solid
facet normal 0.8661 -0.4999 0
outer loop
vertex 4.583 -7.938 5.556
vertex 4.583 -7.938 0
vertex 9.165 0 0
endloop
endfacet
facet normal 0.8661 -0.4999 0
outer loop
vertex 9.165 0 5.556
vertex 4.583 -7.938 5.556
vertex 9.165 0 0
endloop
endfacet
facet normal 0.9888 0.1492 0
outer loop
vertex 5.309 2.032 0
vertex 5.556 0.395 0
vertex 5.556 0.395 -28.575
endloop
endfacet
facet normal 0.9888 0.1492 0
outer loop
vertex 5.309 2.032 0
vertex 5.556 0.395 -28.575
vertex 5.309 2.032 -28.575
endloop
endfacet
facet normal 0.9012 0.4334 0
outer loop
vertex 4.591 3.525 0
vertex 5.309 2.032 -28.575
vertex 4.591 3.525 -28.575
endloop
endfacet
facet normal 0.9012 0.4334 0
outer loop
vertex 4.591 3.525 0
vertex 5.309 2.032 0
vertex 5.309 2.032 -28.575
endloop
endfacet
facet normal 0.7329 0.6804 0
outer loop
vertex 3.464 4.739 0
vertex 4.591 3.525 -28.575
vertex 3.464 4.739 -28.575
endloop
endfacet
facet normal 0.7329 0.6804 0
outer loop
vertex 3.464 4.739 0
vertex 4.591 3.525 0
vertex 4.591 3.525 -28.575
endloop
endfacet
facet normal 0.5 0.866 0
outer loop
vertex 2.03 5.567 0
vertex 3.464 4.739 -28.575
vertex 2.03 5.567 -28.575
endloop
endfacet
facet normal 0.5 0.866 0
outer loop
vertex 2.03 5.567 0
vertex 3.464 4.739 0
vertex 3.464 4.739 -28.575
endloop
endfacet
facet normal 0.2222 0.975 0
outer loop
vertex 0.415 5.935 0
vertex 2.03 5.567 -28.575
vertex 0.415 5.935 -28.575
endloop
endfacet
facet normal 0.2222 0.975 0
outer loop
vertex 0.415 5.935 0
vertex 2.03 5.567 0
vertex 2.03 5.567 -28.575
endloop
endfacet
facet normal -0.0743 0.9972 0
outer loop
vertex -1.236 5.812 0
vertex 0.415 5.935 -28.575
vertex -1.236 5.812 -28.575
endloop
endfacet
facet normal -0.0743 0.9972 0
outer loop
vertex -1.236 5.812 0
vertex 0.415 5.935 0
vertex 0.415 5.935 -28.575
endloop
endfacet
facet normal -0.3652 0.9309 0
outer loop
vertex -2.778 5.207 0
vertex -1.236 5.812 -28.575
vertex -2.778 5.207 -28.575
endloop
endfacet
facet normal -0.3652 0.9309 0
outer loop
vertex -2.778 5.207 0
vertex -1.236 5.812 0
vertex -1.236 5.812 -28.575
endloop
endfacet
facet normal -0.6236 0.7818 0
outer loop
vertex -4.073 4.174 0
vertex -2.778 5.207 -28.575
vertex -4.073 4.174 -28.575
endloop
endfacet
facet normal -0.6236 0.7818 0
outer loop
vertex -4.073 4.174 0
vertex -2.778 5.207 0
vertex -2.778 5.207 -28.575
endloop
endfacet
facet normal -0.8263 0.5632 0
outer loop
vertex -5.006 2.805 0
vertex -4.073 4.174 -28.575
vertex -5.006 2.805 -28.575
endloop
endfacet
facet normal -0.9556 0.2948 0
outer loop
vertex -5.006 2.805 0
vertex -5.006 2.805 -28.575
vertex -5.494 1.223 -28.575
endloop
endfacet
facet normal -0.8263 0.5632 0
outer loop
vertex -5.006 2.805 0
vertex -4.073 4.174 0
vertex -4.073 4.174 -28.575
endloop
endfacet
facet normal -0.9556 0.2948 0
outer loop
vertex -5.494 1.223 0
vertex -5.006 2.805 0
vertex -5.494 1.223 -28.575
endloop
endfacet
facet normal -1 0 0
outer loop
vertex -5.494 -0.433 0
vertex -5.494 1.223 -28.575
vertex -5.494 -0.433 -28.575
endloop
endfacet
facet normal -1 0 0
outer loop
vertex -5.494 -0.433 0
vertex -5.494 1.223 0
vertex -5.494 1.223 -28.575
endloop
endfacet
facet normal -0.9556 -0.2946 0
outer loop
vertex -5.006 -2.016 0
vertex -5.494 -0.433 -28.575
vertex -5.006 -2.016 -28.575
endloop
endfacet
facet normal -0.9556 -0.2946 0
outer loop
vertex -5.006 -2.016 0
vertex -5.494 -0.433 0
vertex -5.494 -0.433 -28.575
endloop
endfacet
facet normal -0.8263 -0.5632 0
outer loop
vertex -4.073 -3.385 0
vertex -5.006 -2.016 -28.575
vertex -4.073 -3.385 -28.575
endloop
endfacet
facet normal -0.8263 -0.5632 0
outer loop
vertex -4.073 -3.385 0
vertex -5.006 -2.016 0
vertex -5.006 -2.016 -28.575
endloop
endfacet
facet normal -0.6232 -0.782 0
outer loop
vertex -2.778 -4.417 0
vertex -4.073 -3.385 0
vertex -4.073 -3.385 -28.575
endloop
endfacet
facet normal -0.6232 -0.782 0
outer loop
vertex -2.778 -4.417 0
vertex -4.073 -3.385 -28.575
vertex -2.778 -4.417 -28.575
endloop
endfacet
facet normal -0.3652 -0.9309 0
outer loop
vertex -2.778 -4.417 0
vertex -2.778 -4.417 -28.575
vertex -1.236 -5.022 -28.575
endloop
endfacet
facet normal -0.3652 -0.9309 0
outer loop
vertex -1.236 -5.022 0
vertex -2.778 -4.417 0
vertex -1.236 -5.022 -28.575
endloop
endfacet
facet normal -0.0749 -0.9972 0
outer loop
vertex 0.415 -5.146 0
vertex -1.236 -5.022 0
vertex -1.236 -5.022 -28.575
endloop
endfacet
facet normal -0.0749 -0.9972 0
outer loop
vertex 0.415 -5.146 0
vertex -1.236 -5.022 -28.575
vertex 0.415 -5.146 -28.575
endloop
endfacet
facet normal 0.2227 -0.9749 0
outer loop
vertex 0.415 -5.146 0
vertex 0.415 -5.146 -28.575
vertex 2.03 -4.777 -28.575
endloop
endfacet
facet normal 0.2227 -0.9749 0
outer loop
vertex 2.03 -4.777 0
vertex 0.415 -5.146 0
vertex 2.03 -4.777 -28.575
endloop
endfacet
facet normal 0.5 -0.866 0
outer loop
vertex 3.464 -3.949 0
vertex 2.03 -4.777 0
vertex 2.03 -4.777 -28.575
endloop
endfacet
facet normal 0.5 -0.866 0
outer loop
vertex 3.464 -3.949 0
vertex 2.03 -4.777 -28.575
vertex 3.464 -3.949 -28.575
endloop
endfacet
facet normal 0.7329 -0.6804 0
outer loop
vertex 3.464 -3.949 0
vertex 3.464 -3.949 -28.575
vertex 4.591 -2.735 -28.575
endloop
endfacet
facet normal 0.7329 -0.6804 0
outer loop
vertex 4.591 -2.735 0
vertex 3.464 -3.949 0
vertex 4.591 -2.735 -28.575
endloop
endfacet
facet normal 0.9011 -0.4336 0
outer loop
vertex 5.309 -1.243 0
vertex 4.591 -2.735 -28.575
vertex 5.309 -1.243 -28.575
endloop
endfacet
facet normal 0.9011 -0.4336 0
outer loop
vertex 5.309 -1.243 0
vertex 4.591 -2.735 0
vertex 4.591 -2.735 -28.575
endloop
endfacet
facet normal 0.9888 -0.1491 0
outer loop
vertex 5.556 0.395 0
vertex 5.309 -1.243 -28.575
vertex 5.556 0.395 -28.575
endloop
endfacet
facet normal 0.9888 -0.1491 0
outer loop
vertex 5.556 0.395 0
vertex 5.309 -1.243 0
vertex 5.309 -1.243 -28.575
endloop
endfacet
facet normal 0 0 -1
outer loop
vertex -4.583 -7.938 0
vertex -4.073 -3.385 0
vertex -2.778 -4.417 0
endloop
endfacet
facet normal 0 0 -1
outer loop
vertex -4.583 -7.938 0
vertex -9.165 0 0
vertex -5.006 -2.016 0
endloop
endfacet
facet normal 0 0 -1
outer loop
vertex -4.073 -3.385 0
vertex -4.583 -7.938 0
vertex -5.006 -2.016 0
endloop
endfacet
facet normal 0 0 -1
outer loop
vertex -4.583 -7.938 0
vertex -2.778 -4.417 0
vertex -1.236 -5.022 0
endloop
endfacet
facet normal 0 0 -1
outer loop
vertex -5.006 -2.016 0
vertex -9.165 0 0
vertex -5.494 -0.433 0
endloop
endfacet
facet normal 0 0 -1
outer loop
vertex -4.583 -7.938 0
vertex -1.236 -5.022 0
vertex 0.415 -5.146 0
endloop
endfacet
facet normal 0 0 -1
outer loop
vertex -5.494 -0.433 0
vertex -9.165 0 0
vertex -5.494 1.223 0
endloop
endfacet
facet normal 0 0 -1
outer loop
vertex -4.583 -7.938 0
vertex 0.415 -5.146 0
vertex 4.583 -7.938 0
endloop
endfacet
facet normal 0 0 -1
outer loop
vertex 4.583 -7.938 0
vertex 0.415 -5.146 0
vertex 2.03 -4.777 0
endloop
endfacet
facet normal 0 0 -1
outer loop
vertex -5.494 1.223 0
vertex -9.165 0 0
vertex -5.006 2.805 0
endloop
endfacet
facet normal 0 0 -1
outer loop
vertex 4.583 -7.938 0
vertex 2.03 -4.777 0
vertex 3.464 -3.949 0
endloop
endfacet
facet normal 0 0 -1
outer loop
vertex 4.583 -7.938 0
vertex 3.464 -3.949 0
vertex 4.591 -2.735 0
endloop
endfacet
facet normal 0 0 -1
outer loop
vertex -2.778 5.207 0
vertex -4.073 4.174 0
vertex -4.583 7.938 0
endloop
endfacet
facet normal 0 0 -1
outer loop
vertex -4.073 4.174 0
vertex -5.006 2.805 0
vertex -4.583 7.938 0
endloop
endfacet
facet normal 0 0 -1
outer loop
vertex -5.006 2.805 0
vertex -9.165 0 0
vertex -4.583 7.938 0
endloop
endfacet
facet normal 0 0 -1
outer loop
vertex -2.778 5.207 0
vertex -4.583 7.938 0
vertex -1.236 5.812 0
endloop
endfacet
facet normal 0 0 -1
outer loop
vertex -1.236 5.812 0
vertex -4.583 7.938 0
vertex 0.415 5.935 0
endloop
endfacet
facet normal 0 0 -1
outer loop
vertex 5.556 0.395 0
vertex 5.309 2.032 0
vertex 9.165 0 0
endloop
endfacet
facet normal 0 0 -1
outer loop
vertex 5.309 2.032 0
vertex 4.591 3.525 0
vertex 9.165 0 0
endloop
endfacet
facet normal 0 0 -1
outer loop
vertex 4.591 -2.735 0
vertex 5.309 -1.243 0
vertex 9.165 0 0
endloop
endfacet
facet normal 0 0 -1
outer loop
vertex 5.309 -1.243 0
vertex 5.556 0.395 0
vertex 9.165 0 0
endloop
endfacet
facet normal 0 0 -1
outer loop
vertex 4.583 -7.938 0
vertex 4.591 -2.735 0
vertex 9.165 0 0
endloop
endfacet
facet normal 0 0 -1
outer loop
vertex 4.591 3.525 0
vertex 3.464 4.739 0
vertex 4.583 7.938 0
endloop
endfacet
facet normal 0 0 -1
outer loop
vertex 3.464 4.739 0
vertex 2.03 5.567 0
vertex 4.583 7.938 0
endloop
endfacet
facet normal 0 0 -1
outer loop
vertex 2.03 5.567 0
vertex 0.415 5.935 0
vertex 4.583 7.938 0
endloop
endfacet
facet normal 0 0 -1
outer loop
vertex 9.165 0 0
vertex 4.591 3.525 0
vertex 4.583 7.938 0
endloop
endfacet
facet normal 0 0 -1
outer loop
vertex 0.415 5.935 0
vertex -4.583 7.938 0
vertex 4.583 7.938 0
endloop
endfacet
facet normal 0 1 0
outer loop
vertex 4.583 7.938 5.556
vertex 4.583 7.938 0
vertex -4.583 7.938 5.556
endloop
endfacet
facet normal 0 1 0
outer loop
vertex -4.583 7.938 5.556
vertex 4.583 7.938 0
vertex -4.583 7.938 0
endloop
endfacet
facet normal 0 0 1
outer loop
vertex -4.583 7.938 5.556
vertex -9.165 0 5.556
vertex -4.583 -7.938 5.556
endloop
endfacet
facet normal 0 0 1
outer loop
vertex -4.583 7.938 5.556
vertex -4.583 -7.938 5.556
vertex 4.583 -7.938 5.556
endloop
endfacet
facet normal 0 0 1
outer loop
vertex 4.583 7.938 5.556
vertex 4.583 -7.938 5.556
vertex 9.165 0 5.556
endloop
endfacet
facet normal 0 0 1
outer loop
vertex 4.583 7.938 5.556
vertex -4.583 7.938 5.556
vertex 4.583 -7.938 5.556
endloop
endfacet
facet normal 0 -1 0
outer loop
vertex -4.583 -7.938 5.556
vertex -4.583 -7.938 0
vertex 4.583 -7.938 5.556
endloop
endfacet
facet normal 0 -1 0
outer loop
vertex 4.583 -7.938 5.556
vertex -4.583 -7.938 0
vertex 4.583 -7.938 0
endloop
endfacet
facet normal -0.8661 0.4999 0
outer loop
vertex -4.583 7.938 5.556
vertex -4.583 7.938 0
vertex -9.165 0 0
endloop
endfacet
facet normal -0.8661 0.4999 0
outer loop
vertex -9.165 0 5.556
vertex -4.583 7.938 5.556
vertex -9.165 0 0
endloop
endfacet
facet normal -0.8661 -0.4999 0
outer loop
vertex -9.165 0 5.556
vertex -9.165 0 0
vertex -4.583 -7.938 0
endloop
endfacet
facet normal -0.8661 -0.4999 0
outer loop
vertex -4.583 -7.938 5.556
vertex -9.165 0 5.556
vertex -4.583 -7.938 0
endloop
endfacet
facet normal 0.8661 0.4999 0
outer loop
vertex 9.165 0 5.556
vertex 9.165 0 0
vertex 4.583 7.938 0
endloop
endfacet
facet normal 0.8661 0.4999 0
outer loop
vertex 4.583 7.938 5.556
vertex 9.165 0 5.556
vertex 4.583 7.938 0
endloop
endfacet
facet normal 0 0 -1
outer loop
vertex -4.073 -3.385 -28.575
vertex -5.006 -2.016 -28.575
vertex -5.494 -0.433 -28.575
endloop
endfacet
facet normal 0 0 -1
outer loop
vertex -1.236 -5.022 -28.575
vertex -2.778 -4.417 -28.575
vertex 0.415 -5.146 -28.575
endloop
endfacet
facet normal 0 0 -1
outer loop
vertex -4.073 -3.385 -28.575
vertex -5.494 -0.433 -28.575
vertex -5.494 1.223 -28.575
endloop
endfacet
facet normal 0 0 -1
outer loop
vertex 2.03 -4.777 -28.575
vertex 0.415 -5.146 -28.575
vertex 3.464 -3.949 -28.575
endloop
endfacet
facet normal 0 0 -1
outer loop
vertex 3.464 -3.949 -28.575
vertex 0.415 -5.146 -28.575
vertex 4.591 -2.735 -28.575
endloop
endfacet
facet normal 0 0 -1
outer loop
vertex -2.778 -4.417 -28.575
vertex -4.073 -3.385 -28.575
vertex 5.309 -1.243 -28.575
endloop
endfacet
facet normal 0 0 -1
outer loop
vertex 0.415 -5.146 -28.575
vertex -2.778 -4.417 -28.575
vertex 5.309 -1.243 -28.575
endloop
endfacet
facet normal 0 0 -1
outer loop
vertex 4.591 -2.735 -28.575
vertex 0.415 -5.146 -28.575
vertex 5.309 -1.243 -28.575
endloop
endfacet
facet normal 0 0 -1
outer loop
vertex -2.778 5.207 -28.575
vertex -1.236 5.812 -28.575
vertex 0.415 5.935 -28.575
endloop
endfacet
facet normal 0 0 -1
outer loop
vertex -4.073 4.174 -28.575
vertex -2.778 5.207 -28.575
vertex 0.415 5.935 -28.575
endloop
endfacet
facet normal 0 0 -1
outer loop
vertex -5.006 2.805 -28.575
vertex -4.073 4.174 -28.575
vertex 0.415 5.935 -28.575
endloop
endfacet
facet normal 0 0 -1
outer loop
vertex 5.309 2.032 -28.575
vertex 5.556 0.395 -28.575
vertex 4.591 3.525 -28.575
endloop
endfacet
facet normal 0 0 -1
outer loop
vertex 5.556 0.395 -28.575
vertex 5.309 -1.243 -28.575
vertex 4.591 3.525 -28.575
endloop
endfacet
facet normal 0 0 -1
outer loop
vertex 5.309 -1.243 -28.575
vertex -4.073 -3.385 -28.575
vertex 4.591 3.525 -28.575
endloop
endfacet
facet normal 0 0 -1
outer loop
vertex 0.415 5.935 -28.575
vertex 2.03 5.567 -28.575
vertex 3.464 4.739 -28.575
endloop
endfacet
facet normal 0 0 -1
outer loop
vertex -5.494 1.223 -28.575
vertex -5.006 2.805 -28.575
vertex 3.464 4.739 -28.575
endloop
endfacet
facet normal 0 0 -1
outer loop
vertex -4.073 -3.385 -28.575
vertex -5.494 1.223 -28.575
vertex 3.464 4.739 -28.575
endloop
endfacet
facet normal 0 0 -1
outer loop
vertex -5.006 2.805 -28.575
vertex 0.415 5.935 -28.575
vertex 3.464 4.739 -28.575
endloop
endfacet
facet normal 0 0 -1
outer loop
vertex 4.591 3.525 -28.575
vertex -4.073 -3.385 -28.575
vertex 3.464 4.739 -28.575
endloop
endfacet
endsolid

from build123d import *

# Parameters (mm, degrees)
F2_DEPTH = 5.55625
F1_R     = 5.55625
F3_DEPTH = 28.575


with BuildPart() as f2:
    # F0 (on Top) → F2 (new body)
    with BuildSketch(Plane.XY):
        Polygon((4.582718, 7.9375), (-4.582718, 7.9375), (-9.165436, 0), (-4.582718, -7.9375), (4.582718, -7.9375), (9.165436, 0), align=None)
    extrude(amount=F2_DEPTH)

    # F1 (on Top) → F3 (join)
    with BuildSketch(Plane.XY):
        with Locations((0, 0.394696)):
            Circle(F1_R)
    extrude(amount=-F3_DEPTH)


solid = f2.part
